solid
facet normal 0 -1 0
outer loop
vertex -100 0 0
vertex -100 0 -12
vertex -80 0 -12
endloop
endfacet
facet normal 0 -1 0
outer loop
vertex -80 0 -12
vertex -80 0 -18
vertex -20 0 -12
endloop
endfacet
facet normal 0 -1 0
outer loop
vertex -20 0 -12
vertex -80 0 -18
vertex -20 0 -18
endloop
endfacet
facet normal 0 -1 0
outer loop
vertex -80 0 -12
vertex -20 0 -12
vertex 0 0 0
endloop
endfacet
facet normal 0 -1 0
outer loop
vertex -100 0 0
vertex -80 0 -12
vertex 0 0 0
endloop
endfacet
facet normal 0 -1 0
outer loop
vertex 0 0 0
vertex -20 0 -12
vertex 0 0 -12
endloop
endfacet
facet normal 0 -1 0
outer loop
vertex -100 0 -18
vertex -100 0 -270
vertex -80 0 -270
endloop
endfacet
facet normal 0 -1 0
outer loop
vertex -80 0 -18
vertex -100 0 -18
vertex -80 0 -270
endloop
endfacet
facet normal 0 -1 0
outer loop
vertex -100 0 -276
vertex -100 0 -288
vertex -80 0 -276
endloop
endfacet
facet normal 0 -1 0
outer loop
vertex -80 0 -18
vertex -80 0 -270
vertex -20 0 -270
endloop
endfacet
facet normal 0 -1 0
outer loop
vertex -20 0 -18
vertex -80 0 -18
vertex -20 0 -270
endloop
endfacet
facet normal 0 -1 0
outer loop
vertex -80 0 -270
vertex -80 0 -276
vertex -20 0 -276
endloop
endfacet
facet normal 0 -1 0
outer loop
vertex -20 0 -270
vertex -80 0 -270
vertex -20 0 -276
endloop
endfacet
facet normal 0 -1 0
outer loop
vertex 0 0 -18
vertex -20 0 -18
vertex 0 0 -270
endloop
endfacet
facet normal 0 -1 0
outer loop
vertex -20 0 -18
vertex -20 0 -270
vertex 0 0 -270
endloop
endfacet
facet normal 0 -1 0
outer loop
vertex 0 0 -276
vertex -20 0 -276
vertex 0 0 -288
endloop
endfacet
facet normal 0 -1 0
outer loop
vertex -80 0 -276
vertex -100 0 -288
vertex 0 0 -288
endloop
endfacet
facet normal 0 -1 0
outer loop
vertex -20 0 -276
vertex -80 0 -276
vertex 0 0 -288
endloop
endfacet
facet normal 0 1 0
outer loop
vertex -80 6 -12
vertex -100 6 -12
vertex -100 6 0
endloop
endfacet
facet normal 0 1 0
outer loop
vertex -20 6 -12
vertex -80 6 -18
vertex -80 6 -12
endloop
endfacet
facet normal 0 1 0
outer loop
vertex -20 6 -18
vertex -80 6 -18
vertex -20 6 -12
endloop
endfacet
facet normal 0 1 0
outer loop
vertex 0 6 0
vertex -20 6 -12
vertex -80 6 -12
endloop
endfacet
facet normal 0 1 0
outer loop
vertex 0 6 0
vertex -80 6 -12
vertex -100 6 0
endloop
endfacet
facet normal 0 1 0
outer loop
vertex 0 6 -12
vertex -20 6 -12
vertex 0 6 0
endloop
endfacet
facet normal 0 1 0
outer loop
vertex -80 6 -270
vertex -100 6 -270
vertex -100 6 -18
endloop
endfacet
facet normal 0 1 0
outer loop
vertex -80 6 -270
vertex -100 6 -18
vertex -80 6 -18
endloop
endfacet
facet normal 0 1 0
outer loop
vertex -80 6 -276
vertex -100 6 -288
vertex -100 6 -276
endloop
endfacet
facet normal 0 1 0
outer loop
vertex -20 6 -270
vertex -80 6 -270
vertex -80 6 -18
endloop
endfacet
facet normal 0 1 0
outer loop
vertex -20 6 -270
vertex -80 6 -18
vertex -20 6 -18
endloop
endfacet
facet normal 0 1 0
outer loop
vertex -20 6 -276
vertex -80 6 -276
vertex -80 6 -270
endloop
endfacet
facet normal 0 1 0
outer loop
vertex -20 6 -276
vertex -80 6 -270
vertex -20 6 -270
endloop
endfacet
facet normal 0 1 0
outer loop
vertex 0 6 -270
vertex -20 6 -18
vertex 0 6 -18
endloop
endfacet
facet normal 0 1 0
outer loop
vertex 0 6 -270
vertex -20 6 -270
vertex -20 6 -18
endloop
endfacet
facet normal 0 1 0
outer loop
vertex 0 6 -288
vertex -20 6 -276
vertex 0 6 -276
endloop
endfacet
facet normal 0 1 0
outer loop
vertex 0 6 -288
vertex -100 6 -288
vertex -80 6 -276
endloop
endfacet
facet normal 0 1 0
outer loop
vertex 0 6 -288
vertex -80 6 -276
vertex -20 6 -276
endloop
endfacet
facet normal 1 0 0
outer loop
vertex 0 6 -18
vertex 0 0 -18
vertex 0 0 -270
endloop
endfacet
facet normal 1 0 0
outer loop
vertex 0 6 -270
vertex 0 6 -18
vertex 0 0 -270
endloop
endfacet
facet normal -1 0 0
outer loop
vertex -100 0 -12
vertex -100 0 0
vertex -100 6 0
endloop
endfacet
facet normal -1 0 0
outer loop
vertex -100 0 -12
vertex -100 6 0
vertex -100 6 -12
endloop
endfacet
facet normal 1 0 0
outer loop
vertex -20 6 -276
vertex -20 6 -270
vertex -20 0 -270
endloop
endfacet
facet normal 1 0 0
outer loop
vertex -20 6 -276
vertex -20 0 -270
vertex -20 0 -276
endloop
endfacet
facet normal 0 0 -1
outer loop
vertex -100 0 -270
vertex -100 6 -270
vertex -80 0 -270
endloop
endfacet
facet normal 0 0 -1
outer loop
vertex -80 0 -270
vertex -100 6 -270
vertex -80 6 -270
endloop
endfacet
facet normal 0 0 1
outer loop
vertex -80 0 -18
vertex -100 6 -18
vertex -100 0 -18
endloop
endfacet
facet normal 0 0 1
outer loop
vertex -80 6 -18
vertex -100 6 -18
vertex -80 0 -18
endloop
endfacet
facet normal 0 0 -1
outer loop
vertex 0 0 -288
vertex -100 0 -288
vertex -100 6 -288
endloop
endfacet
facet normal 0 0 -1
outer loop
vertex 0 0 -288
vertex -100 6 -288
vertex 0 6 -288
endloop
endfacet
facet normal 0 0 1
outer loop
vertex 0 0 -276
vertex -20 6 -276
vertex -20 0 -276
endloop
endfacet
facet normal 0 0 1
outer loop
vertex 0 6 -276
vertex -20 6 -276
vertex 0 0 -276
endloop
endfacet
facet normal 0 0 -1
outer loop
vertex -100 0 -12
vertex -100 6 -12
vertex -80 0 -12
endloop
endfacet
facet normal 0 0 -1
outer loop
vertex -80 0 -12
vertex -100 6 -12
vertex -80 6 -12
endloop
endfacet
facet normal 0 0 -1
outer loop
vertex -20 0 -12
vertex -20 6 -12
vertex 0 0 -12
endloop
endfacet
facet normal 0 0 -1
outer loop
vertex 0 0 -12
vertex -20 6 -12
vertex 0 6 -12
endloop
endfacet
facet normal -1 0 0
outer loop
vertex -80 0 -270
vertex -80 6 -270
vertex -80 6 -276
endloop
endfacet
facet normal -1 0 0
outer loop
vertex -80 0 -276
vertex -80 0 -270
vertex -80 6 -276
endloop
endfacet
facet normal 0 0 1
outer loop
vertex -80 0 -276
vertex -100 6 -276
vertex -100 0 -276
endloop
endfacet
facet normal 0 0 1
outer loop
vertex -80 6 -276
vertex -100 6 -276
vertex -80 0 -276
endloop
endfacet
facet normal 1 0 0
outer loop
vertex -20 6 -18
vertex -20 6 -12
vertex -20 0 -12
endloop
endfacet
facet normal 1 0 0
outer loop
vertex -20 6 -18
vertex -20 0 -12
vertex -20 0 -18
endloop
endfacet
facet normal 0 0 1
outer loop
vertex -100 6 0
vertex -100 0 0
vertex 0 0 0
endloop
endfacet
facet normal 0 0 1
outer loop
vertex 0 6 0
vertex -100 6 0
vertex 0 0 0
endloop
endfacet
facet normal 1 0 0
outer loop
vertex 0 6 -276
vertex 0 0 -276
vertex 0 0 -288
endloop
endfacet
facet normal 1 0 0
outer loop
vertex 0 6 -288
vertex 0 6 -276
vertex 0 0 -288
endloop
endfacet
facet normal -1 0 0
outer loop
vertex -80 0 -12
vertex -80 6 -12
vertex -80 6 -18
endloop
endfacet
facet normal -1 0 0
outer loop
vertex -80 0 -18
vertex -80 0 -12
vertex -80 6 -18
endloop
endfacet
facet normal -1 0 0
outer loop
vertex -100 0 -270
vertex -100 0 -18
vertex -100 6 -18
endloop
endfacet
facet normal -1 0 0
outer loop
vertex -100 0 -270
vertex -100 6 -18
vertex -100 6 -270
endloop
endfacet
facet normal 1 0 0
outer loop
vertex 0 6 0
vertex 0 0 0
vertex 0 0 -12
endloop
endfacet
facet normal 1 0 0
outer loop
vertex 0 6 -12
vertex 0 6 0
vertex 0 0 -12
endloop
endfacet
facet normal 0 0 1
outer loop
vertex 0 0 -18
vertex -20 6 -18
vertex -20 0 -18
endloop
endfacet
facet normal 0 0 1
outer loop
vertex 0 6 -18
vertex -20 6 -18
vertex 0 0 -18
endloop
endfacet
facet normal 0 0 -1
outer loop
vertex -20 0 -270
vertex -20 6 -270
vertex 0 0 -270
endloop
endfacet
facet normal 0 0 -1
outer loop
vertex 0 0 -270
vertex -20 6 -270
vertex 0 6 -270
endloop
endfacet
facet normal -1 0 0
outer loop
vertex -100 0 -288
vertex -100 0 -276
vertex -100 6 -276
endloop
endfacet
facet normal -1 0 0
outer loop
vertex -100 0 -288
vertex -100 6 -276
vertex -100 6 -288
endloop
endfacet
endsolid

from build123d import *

# Parameters (mm, degrees)
SKETCH1_W            = 100
SKETCH1_H            = 288
BOSS_EXTRUDE1_DEPTH  = 6
SKETCH2_W            = 20
SKETCH2_H            = 6
CUT_EXTRUDE1_DEPTH   = 305.926220585
LPATTERN1_COUNT      = 2
LPATTERN1_PITCH      = 258
LPATTERN1_COUNT_DIR2 = 2
LPATTERN1_PITCH_DIR2 = 80


with BuildPart() as part:
    # Sketch1 → Boss-Extrude1 (new body)
    with BuildSketch(Plane(origin=(0, 0, 0), x_dir=(1, 0, 0), z_dir=(0, 1, 0))):
        with Locations((-50, 144)):
            Rectangle(SKETCH1_W, SKETCH1_H)
    extrude(amount=BOSS_EXTRUDE1_DEPTH)

    # Sketch2 → Cut-Extrude1 (cut, through all)
    with BuildSketch(Plane(origin=(0, 6, 0), x_dir=(1, 0, 0), z_dir=(0, 1, 0))):
        with Locations((-90, 273)):
            Rectangle(SKETCH2_W, SKETCH2_H)
    cut_extrude1 = extrude(amount=-CUT_EXTRUDE1_DEPTH, mode=Mode.SUBTRACT)

    # LPattern1: Cut-Extrude1 2 × 2
    with Locations(*[(j * LPATTERN1_PITCH_DIR2, 0, i * LPATTERN1_PITCH) for i in range(LPATTERN1_COUNT) for j in range(LPATTERN1_COUNT_DIR2) if (i, j) != (0, 0)]):
        add(cut_extrude1, mode=Mode.SUBTRACT)


solid = part.part
